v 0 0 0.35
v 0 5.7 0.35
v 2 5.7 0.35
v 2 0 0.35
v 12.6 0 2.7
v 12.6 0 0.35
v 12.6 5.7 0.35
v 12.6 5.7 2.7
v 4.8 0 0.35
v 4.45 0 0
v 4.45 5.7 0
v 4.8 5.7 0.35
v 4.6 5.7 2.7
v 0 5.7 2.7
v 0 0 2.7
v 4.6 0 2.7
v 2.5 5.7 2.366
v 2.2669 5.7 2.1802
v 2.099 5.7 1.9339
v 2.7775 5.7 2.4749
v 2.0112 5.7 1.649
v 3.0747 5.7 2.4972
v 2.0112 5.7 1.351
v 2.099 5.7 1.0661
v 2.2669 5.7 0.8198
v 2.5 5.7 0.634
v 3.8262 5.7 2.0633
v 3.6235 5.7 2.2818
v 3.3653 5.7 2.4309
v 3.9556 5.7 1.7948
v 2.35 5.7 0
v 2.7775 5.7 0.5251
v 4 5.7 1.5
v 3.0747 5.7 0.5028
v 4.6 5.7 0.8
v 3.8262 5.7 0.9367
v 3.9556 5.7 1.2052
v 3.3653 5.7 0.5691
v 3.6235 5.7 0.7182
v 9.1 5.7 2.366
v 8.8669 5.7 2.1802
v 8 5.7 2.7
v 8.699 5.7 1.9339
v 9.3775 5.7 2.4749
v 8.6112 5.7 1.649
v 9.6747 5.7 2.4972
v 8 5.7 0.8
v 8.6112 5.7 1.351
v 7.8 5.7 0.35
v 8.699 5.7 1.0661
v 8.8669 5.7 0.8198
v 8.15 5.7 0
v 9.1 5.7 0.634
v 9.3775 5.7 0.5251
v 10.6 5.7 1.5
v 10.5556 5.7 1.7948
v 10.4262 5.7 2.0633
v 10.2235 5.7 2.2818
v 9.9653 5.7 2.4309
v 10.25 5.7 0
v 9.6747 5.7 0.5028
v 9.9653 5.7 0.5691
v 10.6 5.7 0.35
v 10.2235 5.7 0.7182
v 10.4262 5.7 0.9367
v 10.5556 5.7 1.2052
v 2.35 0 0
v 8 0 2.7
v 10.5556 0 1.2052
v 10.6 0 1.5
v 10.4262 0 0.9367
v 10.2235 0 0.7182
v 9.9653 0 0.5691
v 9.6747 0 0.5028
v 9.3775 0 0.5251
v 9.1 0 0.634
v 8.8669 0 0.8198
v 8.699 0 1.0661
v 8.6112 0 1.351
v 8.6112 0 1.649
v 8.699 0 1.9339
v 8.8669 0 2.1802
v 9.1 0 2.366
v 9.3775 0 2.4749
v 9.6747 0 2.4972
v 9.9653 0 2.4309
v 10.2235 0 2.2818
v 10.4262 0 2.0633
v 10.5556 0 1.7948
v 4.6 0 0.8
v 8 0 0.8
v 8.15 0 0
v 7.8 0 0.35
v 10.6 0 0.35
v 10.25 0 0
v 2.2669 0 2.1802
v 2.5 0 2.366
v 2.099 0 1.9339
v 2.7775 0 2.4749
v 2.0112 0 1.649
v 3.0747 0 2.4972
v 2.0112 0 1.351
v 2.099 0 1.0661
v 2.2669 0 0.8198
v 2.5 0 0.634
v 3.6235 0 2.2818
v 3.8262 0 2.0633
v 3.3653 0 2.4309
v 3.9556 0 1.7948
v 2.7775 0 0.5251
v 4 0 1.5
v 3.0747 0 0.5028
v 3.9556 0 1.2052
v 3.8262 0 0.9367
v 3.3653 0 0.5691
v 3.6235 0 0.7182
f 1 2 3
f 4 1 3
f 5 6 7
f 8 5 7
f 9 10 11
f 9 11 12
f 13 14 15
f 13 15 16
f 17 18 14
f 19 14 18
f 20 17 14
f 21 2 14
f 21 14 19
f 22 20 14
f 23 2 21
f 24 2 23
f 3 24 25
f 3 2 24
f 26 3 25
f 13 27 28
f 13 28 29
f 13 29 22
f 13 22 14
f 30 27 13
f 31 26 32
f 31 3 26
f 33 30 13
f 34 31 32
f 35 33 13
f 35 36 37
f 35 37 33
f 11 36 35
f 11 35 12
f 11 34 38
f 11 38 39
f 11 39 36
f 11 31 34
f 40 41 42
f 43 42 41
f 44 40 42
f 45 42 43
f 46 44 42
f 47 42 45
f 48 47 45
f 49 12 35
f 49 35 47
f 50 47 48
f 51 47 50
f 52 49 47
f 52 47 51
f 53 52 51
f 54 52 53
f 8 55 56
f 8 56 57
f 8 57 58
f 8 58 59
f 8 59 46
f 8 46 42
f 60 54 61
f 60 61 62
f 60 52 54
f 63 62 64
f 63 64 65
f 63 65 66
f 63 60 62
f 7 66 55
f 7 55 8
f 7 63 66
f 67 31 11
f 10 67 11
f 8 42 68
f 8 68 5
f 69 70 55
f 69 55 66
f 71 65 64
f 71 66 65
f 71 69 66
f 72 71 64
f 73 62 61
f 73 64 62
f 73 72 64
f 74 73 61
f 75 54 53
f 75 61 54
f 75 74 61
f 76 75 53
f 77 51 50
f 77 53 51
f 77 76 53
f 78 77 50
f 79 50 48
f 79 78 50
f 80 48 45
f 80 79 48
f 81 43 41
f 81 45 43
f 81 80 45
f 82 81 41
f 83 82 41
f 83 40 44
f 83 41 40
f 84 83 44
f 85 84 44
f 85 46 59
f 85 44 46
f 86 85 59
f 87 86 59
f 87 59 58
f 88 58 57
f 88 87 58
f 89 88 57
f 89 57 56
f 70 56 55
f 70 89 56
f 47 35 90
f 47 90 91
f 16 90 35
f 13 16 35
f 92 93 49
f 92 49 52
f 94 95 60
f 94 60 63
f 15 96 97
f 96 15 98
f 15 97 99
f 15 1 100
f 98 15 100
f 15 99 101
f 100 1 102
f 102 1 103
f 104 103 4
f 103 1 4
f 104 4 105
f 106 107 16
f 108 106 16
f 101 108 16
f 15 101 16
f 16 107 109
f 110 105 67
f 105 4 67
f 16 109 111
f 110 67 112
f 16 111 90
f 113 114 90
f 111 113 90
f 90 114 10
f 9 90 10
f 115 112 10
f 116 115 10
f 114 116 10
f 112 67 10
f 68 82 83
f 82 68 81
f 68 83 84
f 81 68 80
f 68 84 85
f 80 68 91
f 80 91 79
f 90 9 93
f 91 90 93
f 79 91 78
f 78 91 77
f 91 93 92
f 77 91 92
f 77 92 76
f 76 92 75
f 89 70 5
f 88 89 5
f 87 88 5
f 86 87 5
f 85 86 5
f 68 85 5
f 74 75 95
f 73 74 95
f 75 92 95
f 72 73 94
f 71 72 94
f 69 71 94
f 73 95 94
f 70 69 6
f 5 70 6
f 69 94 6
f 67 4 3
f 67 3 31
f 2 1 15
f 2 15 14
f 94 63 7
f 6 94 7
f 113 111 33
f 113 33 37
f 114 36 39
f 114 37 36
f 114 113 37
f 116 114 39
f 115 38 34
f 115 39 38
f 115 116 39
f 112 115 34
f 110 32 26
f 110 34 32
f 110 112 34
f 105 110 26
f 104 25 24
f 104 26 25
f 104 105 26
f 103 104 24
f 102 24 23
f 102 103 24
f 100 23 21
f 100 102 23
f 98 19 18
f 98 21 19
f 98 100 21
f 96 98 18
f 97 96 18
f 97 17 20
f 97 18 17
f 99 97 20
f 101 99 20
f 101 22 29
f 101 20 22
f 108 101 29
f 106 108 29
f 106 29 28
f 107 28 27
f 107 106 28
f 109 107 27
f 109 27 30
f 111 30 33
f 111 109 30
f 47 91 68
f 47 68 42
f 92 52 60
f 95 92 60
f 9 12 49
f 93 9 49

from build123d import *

# Parameters (mm, degrees)
BOX006_W                   = 3
BOX006_H                   = 5.7
BOX006_DEPTH               = 0.35
BOX007_W                   = 2
BOX007_H                   = 5.7
BOX007_DEPTH               = 0.35
BOX005_W                   = 2
BOX005_H                   = 5.7
BOX005_DEPTH               = 0.35
EXTRUDE001_DEPTH           = 5.7
EXTRUDE002_DEPTH           = 5.7
EXTRUDE002_PLACEMENT_ANGLE = 90
EXTRUDE003_DEPTH           = 5.7
EXTRUDE003_PLACEMENT_ANGLE = 90
EXTRUDE_DEPTH              = 5.7
CYLINDER001_R              = 1
CYLINDER001_DEPTH          = 10
CYLINDER_R                 = 1
CYLINDER_DEPTH             = 10
BOX_W                      = 3.4
BOX_H                      = 5.7
BOX_DEPTH                  = 1.9
BOX001_W                   = 12.6
BOX001_H                   = 5.7
BOX001_DEPTH               = 2.7


with BuildPart() as cube006:
    # Box006 → Box006 (new body)
    with BuildSketch(Plane(origin=(4.8, 0, 0), x_dir=(1, 0, 0), z_dir=(0, 0, 1))):
        with Locations((1.5, 2.85)):
            Rectangle(BOX006_W, BOX006_H)
    extrude(amount=BOX006_DEPTH)


with BuildPart() as cube007:
    # Box007 → Box007 (new body)
    with BuildSketch(Plane(origin=(10.6, 0, 0), x_dir=(1, 0, 0), z_dir=(0, 0, 1))):
        with Locations((1, 2.85)):
            Rectangle(BOX007_W, BOX007_H)
    extrude(amount=BOX007_DEPTH)


with BuildPart() as cube005:
    # Box005 → Box005 (new body)
    with BuildSketch(Plane.XY):
        with Locations((1, 2.85)):
            Rectangle(BOX005_W, BOX005_H)
    extrude(amount=BOX005_DEPTH)


with BuildPart() as extrude001:
    # Sketch001 → Extrude001 (new body)
    with BuildSketch(Plane.XZ):
        Polygon((0, 0), (0, 0.35), (0.35, 0), align=None)
    extrude(amount=-EXTRUDE001_DEPTH)


with BuildPart() as extrude001_1:
    # Extrude001 placement: moved
    add(extrude001.part.moved(Location((7.8, 0, 0))))


with BuildPart() as extrude002:
    # Sketch002 → Extrude002 (new body)
    with BuildSketch(Plane.XZ):
        Polygon((0, 0), (0, 0.35), (0.35, 0), align=None)
    extrude(amount=-EXTRUDE002_DEPTH)


with BuildPart() as extrude002_1:
    # Extrude002 placement: moved
    add(extrude002.part.moved(Location((4.8, 0, 0))).rotate(Axis((4.8, 0, 0), (0, -1, 0)), EXTRUDE002_PLACEMENT_ANGLE))


with BuildPart() as extrude003:
    # Sketch003 → Extrude003 (new body)
    with BuildSketch(Plane.XZ):
        Polygon((0, 0), (0, 0.35), (0.35, 0), align=None)
    extrude(amount=-EXTRUDE003_DEPTH)


with BuildPart() as extrude003_1:
    # Extrude003 placement: moved
    add(extrude003.part.moved(Location((10.6, 0, 0))).rotate(Axis((10.6, 0, 0), (0, -1, 0)), EXTRUDE003_PLACEMENT_ANGLE))


with BuildPart() as extrude_body:
    # Sketch → Extrude (new body)
    with BuildSketch(Plane.XZ):
        Polygon((0, 0), (0, 0.35), (0.35, 0), align=None)
    extrude(amount=-EXTRUDE_DEPTH)


with BuildPart() as extrude_body_1:
    # Extrude placement: moved
    add(extrude_body.part.moved(Location((2, 0, 0))))


with BuildPart() as cylinder001:
    # Cylinder001 → Cylinder001 (new body)
    with BuildSketch(Plane(origin=(9.6, -2, 1.5), x_dir=(1, 0, 0), z_dir=(0, 1, 0))):
        Circle(CYLINDER001_R)
    extrude(amount=CYLINDER001_DEPTH)


with BuildPart() as cylinder:
    # Cylinder → Cylinder (new body)
    with BuildSketch(Plane(origin=(3, -2, 1.5), x_dir=(1, 0, 0), z_dir=(0, 1, 0))):
        Circle(CYLINDER_R)
    extrude(amount=CYLINDER_DEPTH)


with BuildPart() as cube:
    # Box → Box (new body)
    with BuildSketch(Plane(origin=(4.6, 0, 0.8), x_dir=(1, 0, 0), z_dir=(0, 0, 1))):
        with Locations((1.7, 2.85)):
            Rectangle(BOX_W, BOX_H)
    extrude(amount=BOX_DEPTH)


with BuildPart() as cut011:
    # Box001 → Box001 (new body)
    with BuildSketch(Plane.XY):
        with Locations((6.3, 2.85)):
            Rectangle(BOX001_W, BOX001_H)
    extrude(amount=BOX001_DEPTH)

    # Cut002: cut Cube
    add(cube.part, mode=Mode.SUBTRACT)

    # Cut003: cut Cylinder
    add(cylinder.part, mode=Mode.SUBTRACT)

    # Cut004: cut Cylinder001
    add(cylinder001.part, mode=Mode.SUBTRACT)

    # Cut005: cut Extrude body
    add(extrude_body_1.part, mode=Mode.SUBTRACT)

    # Cut006: cut Extrude003
    add(extrude003_1.part, mode=Mode.SUBTRACT)

    # Cut007: cut Extrude002
    add(extrude002_1.part, mode=Mode.SUBTRACT)

    # Cut008: cut Extrude001
    add(extrude001_1.part, mode=Mode.SUBTRACT)

    # Cut009: cut Cube005
    add(cube005.part, mode=Mode.SUBTRACT)

    # Cut010: cut Cube007
    add(cube007.part, mode=Mode.SUBTRACT)

    # Cut011: cut Cube006
    add(cube006.part, mode=Mode.SUBTRACT)


solid = cut011.part
